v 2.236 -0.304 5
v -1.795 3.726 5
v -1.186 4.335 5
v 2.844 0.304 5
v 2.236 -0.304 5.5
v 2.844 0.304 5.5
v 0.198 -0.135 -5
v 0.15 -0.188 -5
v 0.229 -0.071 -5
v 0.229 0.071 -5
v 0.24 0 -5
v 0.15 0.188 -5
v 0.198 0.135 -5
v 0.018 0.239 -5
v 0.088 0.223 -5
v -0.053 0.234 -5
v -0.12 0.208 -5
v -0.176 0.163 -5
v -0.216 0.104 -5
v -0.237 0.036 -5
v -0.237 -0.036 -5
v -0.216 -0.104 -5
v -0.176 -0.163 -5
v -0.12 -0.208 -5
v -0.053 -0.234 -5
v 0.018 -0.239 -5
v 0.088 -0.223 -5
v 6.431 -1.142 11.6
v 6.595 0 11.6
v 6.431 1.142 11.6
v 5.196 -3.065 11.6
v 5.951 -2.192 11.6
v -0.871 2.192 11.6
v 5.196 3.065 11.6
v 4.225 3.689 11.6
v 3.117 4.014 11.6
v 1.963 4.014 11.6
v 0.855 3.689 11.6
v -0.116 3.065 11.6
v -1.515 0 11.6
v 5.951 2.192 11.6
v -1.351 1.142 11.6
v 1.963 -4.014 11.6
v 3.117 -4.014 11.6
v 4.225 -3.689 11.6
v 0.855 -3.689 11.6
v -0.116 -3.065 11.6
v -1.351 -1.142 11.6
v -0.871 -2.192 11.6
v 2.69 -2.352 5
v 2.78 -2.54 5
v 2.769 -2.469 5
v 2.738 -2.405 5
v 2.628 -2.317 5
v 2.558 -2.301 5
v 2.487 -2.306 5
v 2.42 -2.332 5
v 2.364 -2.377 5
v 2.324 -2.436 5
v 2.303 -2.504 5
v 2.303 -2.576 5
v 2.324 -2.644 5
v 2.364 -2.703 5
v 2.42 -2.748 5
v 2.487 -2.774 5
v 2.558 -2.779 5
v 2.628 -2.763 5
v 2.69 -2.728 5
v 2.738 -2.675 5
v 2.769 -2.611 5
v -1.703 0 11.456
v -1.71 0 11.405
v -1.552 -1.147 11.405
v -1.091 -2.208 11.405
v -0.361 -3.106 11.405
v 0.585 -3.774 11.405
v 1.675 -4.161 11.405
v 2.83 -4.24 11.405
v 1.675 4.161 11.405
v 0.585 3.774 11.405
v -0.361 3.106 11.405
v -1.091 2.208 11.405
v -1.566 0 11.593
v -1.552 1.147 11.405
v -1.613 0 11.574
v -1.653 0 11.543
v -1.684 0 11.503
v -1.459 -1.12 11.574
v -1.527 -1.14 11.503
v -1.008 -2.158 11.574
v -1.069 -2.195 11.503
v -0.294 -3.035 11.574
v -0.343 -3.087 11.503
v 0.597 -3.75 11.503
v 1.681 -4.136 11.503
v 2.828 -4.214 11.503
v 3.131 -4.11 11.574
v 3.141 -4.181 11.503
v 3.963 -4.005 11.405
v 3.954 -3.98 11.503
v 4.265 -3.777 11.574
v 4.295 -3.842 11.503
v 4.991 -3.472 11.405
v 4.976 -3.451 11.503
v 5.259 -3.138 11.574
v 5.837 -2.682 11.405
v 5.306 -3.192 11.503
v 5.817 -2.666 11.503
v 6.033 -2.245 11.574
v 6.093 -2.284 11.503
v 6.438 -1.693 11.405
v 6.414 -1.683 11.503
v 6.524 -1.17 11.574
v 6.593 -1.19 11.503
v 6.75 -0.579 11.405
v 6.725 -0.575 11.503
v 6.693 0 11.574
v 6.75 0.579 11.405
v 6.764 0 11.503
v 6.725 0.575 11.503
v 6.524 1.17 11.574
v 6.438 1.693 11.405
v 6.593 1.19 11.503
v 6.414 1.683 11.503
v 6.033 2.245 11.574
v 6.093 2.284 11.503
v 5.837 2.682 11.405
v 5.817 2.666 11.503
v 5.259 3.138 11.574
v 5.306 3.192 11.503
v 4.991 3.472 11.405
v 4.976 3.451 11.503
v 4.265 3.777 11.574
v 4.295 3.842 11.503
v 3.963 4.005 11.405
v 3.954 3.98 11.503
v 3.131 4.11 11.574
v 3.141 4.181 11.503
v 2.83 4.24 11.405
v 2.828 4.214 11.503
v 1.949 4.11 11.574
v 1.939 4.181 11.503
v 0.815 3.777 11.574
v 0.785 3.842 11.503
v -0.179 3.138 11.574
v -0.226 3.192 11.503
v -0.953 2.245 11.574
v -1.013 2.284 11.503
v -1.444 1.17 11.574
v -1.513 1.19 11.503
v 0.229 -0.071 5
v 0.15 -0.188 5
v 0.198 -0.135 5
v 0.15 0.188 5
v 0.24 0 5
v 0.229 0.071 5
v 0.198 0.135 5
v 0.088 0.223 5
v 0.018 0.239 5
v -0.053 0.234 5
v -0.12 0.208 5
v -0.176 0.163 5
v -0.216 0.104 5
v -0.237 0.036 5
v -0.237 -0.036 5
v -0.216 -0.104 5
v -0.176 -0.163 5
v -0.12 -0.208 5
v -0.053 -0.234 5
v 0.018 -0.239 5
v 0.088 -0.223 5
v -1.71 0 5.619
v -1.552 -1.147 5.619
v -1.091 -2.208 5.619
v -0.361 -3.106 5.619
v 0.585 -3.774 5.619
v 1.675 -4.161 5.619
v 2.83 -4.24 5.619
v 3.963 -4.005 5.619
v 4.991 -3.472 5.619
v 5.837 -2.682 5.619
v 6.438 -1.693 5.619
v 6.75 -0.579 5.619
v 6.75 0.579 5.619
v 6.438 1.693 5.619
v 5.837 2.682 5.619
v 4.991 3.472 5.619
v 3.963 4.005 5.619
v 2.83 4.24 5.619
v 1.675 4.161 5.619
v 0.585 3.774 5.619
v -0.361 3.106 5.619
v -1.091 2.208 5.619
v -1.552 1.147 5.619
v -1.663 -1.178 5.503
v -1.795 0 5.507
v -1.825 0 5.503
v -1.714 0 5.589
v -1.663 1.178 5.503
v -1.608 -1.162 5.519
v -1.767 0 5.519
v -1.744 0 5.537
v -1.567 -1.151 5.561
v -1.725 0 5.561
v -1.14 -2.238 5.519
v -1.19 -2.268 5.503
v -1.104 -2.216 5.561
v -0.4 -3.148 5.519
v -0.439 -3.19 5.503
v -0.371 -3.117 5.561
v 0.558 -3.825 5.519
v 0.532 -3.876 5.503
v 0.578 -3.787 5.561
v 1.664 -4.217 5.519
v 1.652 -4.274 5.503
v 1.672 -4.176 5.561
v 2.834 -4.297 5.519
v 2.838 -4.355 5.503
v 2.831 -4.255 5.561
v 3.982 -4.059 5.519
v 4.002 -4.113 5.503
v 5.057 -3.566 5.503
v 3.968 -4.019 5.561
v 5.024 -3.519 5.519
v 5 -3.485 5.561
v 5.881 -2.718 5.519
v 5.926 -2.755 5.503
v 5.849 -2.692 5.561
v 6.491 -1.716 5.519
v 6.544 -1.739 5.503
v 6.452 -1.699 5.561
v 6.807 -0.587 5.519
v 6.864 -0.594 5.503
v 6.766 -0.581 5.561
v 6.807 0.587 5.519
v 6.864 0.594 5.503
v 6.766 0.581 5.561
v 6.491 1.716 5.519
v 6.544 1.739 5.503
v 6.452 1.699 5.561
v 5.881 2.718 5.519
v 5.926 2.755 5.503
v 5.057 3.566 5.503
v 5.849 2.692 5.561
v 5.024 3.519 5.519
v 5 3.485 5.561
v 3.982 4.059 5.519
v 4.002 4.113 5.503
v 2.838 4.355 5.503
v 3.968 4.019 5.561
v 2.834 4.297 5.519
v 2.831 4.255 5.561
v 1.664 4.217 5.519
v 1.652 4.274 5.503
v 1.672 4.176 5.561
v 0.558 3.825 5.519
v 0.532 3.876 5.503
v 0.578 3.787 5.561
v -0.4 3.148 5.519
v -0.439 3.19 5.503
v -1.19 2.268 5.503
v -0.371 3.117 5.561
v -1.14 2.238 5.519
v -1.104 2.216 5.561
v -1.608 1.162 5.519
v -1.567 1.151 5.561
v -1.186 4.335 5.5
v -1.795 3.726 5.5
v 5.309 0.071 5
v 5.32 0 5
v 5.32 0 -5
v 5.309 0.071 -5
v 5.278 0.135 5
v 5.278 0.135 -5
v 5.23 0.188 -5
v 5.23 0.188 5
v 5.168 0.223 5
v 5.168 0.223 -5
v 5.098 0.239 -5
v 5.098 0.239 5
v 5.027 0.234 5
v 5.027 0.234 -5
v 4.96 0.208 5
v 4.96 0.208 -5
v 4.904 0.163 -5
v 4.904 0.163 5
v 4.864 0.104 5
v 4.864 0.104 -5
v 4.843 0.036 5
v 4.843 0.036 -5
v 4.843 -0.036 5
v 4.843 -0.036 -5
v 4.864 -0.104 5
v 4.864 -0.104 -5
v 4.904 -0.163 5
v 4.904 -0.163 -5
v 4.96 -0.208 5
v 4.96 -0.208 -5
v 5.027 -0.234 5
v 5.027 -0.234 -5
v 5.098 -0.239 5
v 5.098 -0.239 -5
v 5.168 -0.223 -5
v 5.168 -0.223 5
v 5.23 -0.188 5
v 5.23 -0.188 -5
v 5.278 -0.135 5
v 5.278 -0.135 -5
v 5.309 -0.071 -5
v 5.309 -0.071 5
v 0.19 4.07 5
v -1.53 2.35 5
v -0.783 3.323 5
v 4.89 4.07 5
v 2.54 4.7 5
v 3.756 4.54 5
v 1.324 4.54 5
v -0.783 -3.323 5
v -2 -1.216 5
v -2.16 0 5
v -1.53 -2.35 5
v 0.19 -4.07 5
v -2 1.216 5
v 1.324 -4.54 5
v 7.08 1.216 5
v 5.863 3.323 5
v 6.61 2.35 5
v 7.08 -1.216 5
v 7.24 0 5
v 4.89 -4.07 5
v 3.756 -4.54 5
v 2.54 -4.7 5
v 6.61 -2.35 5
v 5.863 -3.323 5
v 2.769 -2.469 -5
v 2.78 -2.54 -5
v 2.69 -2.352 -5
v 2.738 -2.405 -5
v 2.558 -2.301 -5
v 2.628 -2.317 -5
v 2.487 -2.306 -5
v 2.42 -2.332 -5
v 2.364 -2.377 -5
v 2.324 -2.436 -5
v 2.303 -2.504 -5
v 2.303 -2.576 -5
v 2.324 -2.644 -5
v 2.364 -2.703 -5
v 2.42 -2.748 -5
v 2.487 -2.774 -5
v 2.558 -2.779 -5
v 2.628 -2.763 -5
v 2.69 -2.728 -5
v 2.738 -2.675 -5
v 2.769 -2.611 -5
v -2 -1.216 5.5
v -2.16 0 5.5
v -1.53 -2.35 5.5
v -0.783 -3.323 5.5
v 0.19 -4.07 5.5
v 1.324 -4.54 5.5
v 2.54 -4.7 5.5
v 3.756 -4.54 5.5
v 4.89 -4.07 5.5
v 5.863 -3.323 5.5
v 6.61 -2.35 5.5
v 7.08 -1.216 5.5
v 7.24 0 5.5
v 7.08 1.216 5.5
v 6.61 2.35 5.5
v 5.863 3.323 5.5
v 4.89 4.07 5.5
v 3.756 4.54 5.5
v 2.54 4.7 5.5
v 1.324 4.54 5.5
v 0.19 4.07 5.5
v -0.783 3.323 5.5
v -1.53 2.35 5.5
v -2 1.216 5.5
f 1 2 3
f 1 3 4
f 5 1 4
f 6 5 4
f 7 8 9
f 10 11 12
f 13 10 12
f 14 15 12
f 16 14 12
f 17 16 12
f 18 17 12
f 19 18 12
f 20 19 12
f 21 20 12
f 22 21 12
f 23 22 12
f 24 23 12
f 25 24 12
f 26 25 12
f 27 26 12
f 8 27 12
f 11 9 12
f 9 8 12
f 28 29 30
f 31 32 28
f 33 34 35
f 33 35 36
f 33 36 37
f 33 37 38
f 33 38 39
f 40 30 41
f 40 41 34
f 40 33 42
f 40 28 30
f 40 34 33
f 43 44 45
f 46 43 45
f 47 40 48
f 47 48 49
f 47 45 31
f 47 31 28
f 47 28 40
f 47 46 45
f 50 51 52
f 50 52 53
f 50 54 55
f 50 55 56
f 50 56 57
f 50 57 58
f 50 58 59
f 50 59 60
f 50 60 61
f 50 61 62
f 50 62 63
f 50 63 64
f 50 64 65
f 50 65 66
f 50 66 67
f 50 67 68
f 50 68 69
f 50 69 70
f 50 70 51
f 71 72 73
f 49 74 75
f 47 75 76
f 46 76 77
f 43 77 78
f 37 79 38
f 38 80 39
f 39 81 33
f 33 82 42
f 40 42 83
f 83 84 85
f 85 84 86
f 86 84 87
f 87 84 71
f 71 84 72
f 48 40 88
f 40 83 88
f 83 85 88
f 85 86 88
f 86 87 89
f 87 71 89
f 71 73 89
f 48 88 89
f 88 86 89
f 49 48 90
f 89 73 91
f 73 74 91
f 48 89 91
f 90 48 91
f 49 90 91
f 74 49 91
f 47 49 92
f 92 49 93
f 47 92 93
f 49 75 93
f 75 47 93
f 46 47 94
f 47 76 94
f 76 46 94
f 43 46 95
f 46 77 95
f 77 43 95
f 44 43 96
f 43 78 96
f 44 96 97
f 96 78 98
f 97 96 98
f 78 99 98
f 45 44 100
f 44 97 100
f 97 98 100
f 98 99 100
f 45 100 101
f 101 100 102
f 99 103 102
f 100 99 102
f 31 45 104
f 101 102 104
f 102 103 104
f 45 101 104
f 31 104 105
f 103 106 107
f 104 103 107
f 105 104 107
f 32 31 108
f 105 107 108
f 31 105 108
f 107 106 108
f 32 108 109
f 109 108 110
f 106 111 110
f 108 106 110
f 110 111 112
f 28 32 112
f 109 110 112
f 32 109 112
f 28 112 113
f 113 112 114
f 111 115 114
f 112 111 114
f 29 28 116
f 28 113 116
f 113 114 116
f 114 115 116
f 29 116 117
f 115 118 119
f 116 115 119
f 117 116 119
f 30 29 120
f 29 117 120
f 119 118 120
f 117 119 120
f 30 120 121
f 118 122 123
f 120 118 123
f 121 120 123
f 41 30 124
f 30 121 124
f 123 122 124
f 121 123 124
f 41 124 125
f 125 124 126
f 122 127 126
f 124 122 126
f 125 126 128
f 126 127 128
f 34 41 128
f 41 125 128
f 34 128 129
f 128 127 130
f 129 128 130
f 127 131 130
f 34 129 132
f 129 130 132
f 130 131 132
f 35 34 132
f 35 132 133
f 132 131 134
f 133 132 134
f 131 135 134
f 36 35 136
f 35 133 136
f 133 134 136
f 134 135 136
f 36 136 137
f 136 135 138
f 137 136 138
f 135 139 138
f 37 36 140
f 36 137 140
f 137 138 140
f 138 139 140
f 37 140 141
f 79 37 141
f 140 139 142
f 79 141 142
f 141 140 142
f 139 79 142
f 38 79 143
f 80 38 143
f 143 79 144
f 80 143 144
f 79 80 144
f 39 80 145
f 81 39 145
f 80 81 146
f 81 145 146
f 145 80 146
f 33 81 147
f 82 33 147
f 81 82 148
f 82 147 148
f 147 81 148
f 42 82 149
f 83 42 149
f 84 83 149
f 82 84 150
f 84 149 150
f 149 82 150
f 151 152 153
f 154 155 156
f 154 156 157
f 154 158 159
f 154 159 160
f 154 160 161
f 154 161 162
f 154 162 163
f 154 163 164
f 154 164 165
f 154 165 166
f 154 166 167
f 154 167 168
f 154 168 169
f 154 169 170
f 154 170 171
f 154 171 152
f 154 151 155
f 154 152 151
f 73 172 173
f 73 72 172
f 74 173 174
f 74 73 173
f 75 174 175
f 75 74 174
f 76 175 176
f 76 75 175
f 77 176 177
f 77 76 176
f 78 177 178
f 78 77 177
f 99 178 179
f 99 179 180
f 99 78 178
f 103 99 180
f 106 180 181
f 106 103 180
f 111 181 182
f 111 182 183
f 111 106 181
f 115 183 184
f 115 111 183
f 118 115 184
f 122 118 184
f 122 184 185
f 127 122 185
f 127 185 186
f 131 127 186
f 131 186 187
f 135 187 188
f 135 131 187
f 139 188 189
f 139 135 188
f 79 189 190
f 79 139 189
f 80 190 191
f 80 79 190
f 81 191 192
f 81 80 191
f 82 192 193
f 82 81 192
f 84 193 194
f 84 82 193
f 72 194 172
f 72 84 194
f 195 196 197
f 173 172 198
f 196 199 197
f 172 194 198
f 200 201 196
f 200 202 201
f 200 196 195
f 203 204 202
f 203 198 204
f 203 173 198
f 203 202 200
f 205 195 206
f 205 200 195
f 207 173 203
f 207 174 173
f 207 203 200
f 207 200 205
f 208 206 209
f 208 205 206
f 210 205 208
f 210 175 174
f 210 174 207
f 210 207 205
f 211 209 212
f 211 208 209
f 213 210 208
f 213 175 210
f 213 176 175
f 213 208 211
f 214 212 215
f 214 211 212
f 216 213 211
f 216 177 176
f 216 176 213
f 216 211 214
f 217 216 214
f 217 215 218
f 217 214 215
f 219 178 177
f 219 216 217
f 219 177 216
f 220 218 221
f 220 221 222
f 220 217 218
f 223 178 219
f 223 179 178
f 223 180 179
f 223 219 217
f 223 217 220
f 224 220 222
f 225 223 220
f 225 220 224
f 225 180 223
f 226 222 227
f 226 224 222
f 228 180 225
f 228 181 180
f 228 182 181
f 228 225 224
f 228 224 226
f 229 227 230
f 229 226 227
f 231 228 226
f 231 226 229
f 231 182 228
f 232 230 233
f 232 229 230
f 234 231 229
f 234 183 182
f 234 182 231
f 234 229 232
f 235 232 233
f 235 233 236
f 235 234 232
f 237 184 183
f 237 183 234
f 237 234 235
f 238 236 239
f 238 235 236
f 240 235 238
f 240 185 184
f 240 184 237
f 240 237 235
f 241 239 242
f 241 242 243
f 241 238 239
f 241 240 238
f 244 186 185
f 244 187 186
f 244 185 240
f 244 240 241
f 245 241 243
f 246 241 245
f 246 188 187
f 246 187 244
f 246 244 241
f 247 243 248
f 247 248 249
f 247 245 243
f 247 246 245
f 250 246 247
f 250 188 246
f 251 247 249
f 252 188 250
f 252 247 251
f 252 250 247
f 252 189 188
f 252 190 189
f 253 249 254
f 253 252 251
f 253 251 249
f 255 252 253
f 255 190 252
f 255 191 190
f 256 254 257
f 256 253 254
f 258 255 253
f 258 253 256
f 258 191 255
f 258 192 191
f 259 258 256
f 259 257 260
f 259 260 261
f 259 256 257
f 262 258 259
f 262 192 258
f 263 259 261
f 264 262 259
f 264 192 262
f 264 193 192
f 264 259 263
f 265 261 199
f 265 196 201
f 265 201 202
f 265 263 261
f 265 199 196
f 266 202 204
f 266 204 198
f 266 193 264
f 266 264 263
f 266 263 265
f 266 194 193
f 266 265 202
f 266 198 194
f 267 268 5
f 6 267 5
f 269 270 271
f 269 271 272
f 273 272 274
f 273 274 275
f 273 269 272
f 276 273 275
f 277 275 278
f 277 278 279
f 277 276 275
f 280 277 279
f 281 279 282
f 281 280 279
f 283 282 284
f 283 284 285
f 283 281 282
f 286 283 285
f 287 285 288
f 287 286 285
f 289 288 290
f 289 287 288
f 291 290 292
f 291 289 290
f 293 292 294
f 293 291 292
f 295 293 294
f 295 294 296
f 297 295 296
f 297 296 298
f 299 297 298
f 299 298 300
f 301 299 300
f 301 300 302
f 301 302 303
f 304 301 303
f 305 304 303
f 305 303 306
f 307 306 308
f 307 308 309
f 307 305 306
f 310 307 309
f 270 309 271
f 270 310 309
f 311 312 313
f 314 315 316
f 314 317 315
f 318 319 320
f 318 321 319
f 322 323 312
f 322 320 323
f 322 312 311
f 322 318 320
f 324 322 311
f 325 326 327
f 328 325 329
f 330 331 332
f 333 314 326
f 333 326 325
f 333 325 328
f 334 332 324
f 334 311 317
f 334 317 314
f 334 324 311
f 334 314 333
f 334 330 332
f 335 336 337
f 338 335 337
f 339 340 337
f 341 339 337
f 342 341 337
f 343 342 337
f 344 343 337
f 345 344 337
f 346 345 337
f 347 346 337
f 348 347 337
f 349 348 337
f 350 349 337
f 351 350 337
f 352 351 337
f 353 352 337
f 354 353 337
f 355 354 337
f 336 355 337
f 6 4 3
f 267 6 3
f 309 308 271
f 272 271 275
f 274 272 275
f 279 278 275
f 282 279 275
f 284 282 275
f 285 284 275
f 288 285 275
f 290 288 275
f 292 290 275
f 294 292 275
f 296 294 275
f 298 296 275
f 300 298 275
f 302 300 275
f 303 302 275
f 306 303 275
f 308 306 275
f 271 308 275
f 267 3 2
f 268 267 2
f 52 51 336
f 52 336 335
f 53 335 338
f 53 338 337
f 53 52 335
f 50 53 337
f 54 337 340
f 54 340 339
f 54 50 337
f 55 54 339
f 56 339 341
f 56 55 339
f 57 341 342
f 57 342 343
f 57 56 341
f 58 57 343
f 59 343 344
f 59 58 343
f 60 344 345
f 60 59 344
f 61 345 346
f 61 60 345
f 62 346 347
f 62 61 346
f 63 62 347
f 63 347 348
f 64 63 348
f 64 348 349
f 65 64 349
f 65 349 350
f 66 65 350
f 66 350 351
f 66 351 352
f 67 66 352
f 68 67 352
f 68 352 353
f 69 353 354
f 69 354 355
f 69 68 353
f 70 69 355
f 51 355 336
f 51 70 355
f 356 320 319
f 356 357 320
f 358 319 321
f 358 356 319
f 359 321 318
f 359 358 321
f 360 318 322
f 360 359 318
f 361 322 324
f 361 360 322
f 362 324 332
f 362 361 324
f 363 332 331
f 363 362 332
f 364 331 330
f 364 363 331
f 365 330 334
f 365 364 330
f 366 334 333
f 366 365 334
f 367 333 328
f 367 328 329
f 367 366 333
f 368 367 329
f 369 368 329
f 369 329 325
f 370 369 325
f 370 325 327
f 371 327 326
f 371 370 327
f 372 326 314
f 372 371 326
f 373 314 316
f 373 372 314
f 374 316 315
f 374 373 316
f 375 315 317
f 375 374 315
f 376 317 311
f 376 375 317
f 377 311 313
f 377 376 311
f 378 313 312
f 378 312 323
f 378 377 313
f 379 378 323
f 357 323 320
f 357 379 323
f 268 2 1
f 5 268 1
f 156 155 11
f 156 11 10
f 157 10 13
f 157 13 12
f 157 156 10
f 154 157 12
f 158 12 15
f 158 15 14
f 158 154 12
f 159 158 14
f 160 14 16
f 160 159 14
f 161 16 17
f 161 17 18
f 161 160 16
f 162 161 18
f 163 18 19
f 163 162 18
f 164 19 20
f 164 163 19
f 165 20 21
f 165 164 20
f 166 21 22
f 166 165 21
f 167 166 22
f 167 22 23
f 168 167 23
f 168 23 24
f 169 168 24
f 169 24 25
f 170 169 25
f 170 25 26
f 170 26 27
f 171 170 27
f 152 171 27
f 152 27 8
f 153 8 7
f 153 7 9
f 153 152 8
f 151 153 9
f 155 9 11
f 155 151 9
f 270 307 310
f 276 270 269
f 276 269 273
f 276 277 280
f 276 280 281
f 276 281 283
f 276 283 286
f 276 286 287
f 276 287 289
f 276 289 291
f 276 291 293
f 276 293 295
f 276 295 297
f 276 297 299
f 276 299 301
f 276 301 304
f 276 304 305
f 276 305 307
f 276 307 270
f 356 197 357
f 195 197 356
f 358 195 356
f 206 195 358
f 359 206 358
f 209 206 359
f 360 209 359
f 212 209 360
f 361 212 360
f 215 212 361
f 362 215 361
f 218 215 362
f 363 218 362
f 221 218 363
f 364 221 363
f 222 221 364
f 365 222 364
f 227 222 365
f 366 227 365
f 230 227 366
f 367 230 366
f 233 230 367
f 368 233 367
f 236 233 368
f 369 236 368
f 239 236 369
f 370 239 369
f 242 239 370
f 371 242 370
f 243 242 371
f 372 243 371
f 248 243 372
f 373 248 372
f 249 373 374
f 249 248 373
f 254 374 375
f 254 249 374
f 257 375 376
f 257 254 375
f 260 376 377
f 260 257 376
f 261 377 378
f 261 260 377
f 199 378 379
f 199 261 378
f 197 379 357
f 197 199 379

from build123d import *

# Parameters (mm, degrees)
SKETCH_R     = 0.24
PAD_DEPTH    = 10
PAD003_DEPTH = 0.5


with BuildPart() as pad:
    # Sketch → Pad (new body)
    with BuildSketch(Plane.XY.offset(5)):
        Circle(SKETCH_R)
        with Locations((5.08, 0)):
            Circle(SKETCH_R)
        with Locations((2.54, -2.54)):
            Circle(SKETCH_R)
    extrude(amount=-PAD_DEPTH)


with BuildPart() as revolution:
    # Sketch003 → Revolution (revolve)
    with BuildSketch(Plane.XZ):
        with BuildLine():
            Line((2.54, 5), (-2.16, 5))
            Line((-2.16, 5), (-2.16, 5.5))
            Line((-2.16, 5.5), (-1.82504, 5.502752))
            ThreePointArc((-1.82504, 5.502752), (-1.743637, 5.537059), (-1.71, 5.61874))
            Line((-1.71, 5.61874), (-1.71, 11.405088))
            ThreePointArc((-1.515088, 11.6), (-1.652912, 11.542912), (-1.71, 11.405088))
            Line((-1.515088, 11.6), (2.54, 11.6))
            Line((2.54, 11.6), (2.54, 5))
        make_face()
    revolve(axis=Axis((2.54, 0, 2.550668), (0, 0, 1)))


with BuildPart() as pad003:
    # Sketch004 → Pad003 (new body)
    with BuildSketch(Plane.XY.offset(5)):
        Polygon((2.844056, 0.304056), (-1.186453, 4.334565), (-1.794565, 3.726453), (2.235944, -0.304056), align=None)
    extrude(amount=PAD003_DEPTH)


solid = Compound([pad.part, revolution.part, pad003.part])
